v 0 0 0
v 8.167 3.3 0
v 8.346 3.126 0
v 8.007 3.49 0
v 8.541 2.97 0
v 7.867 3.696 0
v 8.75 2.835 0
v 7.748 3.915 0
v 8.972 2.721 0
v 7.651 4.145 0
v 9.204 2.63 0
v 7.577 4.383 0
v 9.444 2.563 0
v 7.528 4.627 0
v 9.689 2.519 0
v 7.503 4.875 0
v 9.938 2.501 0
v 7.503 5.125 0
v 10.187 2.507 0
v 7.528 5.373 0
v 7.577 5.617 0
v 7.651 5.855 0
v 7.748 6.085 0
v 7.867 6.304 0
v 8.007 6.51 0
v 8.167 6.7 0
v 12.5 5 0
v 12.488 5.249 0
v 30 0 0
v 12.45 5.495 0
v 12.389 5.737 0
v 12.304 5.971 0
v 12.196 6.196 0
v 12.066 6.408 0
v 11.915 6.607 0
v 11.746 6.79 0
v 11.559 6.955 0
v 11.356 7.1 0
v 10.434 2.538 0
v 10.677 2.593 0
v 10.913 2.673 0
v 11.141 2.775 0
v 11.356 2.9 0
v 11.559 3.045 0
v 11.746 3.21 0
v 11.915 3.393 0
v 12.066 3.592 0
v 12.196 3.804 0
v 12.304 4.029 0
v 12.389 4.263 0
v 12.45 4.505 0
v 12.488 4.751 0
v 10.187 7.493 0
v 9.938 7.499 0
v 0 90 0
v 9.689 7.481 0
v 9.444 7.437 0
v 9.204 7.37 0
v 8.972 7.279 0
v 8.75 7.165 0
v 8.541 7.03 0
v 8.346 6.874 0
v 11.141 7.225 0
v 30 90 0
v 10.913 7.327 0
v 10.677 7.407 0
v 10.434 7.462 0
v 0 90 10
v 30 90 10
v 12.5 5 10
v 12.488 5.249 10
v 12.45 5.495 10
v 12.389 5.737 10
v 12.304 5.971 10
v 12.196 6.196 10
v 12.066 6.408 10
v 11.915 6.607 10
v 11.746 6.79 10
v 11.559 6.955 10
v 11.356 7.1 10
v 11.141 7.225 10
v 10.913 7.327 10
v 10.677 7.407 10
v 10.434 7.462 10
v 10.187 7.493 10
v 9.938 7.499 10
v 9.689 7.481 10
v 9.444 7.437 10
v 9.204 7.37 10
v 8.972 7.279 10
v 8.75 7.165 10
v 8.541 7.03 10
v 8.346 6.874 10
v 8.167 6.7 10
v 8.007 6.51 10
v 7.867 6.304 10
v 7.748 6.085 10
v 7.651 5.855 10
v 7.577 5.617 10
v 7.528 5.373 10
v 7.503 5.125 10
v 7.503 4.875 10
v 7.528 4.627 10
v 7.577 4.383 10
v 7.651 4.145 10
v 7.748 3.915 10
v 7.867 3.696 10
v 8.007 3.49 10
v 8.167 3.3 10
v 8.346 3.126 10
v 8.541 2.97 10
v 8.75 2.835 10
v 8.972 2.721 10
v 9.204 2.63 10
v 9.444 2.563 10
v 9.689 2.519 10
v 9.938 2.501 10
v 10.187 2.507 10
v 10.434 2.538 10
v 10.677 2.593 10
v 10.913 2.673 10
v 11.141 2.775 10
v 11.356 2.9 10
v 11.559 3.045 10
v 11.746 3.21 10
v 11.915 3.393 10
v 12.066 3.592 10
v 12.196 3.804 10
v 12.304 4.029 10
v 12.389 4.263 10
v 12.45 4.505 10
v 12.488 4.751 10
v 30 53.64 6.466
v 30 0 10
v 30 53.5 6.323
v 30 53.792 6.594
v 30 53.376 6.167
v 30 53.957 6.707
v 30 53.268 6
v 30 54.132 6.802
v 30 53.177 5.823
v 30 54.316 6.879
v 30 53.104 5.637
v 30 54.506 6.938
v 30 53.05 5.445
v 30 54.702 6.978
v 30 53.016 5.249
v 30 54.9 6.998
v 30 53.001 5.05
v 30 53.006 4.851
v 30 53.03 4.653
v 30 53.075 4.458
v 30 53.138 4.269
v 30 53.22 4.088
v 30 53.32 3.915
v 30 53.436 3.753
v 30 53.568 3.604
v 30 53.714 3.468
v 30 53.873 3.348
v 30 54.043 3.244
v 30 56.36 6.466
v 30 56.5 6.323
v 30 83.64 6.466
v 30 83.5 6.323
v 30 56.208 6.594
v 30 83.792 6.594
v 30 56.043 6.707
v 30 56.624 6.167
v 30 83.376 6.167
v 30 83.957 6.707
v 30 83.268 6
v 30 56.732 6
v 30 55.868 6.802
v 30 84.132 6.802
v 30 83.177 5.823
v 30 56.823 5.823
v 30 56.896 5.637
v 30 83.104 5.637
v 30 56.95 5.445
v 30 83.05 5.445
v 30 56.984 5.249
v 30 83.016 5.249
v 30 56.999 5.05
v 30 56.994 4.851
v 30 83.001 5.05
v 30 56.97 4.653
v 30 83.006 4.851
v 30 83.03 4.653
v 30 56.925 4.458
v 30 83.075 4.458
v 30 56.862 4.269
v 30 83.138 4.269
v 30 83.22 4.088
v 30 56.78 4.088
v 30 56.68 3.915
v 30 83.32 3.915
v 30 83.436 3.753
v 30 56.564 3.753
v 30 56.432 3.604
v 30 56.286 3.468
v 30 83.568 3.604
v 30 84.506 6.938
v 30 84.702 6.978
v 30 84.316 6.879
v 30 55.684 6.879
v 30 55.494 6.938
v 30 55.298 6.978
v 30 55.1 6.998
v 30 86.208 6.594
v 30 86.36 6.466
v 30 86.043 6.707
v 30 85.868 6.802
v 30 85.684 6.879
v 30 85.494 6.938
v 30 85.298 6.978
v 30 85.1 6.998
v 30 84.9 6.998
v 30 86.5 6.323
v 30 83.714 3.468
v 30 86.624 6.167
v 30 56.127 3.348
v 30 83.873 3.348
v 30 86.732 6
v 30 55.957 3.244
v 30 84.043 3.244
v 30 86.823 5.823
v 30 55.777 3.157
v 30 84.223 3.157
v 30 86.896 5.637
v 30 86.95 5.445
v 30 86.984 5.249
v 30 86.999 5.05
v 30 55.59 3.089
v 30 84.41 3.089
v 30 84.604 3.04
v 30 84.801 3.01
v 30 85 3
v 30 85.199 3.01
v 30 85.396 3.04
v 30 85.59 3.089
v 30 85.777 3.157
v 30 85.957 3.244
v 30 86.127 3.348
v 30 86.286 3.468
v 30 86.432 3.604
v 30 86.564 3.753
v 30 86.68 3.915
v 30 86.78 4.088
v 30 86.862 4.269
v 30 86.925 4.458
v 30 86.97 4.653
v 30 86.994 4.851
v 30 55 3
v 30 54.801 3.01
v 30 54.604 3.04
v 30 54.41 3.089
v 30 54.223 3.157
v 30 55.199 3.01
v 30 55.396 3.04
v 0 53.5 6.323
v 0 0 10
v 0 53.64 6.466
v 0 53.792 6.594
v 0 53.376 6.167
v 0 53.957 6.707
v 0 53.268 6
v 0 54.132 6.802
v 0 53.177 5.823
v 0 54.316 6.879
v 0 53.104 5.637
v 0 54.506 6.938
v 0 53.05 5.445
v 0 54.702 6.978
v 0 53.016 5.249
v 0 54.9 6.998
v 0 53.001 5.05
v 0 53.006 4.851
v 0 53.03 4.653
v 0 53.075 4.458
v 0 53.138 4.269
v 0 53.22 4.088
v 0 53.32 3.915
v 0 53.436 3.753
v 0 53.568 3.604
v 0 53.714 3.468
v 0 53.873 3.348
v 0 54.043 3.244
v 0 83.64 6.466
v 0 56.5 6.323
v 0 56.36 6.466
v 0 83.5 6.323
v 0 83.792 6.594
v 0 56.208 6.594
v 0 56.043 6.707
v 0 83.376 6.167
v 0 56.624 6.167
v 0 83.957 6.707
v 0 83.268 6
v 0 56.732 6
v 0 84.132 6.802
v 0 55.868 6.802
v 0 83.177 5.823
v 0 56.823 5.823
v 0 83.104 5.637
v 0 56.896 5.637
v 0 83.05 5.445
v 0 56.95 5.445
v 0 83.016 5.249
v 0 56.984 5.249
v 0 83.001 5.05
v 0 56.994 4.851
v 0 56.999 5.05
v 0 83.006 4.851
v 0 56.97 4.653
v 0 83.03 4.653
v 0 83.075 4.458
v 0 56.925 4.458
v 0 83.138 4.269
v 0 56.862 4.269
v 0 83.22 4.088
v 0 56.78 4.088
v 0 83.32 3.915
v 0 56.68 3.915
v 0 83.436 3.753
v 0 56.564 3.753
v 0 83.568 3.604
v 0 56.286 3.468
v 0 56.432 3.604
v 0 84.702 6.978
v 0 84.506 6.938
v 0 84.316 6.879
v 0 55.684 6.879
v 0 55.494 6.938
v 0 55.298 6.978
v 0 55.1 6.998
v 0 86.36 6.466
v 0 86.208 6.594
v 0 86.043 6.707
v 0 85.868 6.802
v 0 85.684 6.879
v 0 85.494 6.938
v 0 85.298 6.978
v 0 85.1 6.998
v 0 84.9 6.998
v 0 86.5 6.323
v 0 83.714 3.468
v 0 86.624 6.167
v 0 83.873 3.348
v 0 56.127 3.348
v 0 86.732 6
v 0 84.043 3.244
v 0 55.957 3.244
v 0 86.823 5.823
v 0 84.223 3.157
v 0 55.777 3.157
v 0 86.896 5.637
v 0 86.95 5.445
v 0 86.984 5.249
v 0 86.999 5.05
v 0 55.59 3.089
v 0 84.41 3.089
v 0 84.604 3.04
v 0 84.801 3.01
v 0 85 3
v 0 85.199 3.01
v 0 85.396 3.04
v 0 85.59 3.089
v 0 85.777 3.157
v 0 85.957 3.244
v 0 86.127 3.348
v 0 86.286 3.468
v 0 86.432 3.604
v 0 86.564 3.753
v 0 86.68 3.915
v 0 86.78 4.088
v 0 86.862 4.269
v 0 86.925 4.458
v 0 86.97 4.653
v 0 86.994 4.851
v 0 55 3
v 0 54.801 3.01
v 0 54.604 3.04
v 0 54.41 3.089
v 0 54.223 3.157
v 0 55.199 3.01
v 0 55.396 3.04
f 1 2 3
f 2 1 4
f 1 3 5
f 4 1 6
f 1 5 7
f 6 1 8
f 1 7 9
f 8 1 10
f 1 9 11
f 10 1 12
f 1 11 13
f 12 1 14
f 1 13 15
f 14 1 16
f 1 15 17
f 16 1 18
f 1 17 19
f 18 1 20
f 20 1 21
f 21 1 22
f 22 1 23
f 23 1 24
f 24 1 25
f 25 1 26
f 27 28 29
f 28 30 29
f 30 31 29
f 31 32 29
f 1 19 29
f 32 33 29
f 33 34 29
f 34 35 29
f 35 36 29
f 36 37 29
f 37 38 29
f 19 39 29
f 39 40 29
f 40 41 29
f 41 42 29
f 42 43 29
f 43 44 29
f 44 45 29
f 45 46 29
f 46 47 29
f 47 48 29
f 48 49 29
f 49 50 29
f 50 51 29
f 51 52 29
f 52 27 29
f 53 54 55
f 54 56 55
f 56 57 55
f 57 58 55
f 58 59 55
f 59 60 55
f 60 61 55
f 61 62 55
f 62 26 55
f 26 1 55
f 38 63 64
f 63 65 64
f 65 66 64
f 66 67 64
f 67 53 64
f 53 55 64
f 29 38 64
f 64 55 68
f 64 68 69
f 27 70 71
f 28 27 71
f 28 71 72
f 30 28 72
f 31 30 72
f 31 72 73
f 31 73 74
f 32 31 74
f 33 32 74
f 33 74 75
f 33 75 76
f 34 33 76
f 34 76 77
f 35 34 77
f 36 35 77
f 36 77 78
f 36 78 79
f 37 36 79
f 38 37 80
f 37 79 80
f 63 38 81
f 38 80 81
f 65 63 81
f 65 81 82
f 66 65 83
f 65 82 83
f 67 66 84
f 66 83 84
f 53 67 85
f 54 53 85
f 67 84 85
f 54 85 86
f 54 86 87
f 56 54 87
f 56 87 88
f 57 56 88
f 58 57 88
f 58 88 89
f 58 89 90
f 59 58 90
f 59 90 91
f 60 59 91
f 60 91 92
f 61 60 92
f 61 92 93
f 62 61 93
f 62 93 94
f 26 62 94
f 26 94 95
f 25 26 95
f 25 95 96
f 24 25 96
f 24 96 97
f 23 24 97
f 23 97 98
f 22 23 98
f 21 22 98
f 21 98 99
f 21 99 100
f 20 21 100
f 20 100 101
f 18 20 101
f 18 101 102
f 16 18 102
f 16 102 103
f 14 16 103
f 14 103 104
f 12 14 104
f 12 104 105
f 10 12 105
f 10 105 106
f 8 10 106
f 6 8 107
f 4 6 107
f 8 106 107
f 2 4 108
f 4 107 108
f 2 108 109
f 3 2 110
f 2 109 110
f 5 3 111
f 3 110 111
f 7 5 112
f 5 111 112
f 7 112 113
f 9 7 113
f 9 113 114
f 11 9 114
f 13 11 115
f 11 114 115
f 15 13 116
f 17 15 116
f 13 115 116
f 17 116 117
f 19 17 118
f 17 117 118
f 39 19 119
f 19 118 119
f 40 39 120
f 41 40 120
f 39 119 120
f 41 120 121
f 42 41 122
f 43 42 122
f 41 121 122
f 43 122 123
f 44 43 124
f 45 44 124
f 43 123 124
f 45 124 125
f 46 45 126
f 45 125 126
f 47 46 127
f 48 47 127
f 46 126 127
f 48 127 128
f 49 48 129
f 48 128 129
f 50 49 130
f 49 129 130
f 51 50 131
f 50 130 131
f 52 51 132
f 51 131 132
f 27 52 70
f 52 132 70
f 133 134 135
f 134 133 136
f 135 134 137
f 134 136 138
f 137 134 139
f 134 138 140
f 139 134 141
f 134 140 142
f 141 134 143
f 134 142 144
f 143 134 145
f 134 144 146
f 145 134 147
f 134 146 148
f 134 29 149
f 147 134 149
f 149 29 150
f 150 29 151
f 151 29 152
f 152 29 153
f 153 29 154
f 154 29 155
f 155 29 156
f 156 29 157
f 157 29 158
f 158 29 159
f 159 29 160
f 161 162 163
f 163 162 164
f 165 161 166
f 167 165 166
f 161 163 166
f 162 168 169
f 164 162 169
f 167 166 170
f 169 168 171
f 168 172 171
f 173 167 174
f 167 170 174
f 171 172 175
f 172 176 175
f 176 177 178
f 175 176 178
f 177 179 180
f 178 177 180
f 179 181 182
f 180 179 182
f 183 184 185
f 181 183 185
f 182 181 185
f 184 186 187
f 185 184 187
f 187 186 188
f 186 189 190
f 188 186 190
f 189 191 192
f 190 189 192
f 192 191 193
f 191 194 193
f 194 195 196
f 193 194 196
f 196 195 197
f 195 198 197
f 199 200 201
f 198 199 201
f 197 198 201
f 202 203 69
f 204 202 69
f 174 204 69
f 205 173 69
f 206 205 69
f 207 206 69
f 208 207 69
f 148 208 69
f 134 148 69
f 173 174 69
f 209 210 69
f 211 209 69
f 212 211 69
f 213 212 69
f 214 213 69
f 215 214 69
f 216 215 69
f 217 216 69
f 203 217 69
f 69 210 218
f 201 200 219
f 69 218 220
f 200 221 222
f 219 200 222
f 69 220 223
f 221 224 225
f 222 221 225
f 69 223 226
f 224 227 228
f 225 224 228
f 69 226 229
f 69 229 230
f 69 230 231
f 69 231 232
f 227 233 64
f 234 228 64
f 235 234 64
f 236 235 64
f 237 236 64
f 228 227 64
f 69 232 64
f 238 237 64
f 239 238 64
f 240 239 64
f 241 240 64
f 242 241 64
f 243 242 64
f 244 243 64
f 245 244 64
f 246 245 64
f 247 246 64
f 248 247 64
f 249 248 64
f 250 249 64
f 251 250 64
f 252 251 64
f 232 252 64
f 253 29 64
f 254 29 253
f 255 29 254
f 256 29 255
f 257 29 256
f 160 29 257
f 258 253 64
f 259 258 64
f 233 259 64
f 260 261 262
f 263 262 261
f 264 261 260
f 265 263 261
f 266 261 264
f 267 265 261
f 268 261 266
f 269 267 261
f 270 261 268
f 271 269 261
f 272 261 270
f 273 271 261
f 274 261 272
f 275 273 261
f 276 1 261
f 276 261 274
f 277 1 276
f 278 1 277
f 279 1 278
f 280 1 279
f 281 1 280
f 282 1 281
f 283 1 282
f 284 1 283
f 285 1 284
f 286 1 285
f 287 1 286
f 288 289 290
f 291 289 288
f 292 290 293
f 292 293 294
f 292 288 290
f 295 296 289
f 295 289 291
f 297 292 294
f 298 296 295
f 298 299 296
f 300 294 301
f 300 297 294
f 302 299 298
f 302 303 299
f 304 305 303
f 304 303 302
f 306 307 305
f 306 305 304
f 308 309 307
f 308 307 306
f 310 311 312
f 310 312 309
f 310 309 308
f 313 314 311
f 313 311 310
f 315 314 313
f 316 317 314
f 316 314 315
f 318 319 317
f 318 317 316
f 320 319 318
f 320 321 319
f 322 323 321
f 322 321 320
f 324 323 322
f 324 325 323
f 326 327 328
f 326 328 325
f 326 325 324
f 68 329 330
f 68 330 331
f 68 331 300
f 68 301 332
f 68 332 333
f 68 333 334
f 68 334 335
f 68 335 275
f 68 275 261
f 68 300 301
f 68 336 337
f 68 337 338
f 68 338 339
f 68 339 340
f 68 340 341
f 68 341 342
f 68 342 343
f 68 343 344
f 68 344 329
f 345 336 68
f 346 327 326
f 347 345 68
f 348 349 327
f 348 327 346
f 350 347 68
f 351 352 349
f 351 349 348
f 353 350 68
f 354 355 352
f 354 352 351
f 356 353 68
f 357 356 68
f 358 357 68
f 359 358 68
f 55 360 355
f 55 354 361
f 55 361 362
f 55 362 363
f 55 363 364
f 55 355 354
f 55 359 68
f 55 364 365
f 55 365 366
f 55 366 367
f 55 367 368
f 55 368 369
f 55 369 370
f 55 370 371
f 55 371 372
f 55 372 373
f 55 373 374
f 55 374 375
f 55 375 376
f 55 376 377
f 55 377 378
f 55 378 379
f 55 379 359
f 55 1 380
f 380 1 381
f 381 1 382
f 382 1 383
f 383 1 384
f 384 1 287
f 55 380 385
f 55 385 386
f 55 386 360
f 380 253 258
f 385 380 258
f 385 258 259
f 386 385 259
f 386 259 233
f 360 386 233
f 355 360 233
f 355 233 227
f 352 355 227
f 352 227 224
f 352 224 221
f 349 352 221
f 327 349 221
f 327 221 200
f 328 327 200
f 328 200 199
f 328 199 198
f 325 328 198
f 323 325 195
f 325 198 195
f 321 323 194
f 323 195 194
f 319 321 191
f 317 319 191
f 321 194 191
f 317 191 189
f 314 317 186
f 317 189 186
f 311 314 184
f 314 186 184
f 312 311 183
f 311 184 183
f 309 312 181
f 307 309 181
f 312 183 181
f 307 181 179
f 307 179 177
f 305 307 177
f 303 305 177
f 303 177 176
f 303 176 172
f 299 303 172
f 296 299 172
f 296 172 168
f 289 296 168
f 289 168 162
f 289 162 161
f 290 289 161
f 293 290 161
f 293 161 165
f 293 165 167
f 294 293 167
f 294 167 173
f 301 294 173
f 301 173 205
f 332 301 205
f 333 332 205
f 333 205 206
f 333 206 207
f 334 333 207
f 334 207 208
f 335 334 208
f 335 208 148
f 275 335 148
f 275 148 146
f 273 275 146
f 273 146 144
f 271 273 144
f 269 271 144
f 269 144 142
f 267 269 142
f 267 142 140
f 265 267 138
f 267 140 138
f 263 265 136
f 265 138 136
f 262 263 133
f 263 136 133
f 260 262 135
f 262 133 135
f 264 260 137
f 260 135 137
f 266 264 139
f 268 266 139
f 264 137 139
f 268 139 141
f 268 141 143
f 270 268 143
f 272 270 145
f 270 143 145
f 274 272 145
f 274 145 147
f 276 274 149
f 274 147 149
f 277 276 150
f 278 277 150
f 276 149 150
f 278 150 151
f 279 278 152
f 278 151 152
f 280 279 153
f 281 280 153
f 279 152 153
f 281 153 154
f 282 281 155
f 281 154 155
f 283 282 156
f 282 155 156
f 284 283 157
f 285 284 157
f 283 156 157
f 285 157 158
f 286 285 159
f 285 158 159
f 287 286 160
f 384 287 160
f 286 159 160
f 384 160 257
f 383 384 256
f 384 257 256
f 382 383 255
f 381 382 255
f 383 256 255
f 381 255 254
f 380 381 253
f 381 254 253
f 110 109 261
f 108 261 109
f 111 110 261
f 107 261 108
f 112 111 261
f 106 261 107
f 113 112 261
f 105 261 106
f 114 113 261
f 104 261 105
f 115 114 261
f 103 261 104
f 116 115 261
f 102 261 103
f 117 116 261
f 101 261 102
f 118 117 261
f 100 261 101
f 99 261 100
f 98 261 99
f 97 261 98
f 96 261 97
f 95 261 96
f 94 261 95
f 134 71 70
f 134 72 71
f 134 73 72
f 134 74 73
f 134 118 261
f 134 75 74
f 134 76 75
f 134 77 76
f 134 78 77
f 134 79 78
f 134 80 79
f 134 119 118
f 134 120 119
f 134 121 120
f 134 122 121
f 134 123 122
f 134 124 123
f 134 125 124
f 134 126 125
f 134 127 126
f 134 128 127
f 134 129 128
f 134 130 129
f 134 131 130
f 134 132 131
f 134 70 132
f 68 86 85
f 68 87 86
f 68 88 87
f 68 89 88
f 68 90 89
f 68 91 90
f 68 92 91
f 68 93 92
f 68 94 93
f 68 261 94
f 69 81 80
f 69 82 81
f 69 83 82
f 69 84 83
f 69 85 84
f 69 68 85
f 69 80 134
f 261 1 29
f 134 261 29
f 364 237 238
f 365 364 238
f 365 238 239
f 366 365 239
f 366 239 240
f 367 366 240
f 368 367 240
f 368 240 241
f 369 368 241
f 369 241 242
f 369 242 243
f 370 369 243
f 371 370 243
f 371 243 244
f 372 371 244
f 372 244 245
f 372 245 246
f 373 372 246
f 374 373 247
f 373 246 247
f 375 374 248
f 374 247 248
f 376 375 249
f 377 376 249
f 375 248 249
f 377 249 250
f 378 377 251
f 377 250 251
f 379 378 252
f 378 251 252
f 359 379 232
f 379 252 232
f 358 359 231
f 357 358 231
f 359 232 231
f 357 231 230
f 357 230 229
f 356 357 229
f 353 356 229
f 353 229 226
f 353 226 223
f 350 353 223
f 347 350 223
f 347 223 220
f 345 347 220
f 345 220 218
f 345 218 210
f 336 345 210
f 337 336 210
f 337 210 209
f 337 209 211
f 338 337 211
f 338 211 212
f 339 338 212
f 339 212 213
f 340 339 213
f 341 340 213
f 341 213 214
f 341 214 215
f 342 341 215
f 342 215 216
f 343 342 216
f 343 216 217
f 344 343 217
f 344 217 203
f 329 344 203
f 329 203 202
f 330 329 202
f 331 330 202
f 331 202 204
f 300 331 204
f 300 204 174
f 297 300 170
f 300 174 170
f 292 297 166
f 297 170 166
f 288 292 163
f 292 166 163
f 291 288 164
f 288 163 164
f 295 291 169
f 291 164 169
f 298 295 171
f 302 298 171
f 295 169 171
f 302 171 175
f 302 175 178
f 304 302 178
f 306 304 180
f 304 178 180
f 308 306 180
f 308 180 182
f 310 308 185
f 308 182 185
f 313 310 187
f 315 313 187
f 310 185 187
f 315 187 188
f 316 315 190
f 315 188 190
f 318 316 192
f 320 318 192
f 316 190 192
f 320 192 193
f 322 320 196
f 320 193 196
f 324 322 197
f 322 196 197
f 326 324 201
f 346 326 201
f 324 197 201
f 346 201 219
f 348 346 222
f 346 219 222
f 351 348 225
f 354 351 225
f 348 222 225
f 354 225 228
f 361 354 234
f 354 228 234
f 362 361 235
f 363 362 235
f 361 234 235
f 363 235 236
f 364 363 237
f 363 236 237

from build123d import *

# Parameters (mm, degrees)
SKETCH1_W           = 30
SKETCH1_H           = 90
BOSS_EXTRUDE1_DEPTH = 10
CUT_EXTRUDE2_REACH  = 97.394
SKETCH4_R           = 2.5
SKETCH3_R           = 2
CUT_EXTRUDE3_DEPTH  = 96.393920142


with BuildPart() as part:
    # Sketch1 → Boss-Extrude1 (new body)
    with BuildSketch(Plane.XY):
        with Locations((15, 45)):
            Rectangle(SKETCH1_W, SKETCH1_H)
    extrude(amount=BOSS_EXTRUDE1_DEPTH)

    # Sketch4 → Cut-Extrude2 (cut, up to next)
    with BuildSketch(Plane.XY.offset(10), mode=Mode.PRIVATE) as cut_extrude2_sk1:
        with Locations((10, 5)):
            Circle(SKETCH4_R)
    cut_extrude2_tool1 = extrude(cut_extrude2_sk1.sketch, amount=-CUT_EXTRUDE2_REACH, mode=Mode.PRIVATE) & part.part
    add(cut_extrude2_tool1.solids().sort_by_distance((10, 5, 10))[0], mode=Mode.SUBTRACT)

    # Sketch3 → Cut-Extrude3 (cut, through all)
    with BuildSketch(Plane(origin=(30, 0, 0), x_dir=(0, 0, -1), z_dir=(1, 0, 0))):
        with Locations((-5, 85)):
            Circle(SKETCH3_R)
        with Locations((-5, 55)):
            Circle(SKETCH3_R)
    extrude(amount=-CUT_EXTRUDE3_DEPTH, mode=Mode.SUBTRACT)


solid = part.part
